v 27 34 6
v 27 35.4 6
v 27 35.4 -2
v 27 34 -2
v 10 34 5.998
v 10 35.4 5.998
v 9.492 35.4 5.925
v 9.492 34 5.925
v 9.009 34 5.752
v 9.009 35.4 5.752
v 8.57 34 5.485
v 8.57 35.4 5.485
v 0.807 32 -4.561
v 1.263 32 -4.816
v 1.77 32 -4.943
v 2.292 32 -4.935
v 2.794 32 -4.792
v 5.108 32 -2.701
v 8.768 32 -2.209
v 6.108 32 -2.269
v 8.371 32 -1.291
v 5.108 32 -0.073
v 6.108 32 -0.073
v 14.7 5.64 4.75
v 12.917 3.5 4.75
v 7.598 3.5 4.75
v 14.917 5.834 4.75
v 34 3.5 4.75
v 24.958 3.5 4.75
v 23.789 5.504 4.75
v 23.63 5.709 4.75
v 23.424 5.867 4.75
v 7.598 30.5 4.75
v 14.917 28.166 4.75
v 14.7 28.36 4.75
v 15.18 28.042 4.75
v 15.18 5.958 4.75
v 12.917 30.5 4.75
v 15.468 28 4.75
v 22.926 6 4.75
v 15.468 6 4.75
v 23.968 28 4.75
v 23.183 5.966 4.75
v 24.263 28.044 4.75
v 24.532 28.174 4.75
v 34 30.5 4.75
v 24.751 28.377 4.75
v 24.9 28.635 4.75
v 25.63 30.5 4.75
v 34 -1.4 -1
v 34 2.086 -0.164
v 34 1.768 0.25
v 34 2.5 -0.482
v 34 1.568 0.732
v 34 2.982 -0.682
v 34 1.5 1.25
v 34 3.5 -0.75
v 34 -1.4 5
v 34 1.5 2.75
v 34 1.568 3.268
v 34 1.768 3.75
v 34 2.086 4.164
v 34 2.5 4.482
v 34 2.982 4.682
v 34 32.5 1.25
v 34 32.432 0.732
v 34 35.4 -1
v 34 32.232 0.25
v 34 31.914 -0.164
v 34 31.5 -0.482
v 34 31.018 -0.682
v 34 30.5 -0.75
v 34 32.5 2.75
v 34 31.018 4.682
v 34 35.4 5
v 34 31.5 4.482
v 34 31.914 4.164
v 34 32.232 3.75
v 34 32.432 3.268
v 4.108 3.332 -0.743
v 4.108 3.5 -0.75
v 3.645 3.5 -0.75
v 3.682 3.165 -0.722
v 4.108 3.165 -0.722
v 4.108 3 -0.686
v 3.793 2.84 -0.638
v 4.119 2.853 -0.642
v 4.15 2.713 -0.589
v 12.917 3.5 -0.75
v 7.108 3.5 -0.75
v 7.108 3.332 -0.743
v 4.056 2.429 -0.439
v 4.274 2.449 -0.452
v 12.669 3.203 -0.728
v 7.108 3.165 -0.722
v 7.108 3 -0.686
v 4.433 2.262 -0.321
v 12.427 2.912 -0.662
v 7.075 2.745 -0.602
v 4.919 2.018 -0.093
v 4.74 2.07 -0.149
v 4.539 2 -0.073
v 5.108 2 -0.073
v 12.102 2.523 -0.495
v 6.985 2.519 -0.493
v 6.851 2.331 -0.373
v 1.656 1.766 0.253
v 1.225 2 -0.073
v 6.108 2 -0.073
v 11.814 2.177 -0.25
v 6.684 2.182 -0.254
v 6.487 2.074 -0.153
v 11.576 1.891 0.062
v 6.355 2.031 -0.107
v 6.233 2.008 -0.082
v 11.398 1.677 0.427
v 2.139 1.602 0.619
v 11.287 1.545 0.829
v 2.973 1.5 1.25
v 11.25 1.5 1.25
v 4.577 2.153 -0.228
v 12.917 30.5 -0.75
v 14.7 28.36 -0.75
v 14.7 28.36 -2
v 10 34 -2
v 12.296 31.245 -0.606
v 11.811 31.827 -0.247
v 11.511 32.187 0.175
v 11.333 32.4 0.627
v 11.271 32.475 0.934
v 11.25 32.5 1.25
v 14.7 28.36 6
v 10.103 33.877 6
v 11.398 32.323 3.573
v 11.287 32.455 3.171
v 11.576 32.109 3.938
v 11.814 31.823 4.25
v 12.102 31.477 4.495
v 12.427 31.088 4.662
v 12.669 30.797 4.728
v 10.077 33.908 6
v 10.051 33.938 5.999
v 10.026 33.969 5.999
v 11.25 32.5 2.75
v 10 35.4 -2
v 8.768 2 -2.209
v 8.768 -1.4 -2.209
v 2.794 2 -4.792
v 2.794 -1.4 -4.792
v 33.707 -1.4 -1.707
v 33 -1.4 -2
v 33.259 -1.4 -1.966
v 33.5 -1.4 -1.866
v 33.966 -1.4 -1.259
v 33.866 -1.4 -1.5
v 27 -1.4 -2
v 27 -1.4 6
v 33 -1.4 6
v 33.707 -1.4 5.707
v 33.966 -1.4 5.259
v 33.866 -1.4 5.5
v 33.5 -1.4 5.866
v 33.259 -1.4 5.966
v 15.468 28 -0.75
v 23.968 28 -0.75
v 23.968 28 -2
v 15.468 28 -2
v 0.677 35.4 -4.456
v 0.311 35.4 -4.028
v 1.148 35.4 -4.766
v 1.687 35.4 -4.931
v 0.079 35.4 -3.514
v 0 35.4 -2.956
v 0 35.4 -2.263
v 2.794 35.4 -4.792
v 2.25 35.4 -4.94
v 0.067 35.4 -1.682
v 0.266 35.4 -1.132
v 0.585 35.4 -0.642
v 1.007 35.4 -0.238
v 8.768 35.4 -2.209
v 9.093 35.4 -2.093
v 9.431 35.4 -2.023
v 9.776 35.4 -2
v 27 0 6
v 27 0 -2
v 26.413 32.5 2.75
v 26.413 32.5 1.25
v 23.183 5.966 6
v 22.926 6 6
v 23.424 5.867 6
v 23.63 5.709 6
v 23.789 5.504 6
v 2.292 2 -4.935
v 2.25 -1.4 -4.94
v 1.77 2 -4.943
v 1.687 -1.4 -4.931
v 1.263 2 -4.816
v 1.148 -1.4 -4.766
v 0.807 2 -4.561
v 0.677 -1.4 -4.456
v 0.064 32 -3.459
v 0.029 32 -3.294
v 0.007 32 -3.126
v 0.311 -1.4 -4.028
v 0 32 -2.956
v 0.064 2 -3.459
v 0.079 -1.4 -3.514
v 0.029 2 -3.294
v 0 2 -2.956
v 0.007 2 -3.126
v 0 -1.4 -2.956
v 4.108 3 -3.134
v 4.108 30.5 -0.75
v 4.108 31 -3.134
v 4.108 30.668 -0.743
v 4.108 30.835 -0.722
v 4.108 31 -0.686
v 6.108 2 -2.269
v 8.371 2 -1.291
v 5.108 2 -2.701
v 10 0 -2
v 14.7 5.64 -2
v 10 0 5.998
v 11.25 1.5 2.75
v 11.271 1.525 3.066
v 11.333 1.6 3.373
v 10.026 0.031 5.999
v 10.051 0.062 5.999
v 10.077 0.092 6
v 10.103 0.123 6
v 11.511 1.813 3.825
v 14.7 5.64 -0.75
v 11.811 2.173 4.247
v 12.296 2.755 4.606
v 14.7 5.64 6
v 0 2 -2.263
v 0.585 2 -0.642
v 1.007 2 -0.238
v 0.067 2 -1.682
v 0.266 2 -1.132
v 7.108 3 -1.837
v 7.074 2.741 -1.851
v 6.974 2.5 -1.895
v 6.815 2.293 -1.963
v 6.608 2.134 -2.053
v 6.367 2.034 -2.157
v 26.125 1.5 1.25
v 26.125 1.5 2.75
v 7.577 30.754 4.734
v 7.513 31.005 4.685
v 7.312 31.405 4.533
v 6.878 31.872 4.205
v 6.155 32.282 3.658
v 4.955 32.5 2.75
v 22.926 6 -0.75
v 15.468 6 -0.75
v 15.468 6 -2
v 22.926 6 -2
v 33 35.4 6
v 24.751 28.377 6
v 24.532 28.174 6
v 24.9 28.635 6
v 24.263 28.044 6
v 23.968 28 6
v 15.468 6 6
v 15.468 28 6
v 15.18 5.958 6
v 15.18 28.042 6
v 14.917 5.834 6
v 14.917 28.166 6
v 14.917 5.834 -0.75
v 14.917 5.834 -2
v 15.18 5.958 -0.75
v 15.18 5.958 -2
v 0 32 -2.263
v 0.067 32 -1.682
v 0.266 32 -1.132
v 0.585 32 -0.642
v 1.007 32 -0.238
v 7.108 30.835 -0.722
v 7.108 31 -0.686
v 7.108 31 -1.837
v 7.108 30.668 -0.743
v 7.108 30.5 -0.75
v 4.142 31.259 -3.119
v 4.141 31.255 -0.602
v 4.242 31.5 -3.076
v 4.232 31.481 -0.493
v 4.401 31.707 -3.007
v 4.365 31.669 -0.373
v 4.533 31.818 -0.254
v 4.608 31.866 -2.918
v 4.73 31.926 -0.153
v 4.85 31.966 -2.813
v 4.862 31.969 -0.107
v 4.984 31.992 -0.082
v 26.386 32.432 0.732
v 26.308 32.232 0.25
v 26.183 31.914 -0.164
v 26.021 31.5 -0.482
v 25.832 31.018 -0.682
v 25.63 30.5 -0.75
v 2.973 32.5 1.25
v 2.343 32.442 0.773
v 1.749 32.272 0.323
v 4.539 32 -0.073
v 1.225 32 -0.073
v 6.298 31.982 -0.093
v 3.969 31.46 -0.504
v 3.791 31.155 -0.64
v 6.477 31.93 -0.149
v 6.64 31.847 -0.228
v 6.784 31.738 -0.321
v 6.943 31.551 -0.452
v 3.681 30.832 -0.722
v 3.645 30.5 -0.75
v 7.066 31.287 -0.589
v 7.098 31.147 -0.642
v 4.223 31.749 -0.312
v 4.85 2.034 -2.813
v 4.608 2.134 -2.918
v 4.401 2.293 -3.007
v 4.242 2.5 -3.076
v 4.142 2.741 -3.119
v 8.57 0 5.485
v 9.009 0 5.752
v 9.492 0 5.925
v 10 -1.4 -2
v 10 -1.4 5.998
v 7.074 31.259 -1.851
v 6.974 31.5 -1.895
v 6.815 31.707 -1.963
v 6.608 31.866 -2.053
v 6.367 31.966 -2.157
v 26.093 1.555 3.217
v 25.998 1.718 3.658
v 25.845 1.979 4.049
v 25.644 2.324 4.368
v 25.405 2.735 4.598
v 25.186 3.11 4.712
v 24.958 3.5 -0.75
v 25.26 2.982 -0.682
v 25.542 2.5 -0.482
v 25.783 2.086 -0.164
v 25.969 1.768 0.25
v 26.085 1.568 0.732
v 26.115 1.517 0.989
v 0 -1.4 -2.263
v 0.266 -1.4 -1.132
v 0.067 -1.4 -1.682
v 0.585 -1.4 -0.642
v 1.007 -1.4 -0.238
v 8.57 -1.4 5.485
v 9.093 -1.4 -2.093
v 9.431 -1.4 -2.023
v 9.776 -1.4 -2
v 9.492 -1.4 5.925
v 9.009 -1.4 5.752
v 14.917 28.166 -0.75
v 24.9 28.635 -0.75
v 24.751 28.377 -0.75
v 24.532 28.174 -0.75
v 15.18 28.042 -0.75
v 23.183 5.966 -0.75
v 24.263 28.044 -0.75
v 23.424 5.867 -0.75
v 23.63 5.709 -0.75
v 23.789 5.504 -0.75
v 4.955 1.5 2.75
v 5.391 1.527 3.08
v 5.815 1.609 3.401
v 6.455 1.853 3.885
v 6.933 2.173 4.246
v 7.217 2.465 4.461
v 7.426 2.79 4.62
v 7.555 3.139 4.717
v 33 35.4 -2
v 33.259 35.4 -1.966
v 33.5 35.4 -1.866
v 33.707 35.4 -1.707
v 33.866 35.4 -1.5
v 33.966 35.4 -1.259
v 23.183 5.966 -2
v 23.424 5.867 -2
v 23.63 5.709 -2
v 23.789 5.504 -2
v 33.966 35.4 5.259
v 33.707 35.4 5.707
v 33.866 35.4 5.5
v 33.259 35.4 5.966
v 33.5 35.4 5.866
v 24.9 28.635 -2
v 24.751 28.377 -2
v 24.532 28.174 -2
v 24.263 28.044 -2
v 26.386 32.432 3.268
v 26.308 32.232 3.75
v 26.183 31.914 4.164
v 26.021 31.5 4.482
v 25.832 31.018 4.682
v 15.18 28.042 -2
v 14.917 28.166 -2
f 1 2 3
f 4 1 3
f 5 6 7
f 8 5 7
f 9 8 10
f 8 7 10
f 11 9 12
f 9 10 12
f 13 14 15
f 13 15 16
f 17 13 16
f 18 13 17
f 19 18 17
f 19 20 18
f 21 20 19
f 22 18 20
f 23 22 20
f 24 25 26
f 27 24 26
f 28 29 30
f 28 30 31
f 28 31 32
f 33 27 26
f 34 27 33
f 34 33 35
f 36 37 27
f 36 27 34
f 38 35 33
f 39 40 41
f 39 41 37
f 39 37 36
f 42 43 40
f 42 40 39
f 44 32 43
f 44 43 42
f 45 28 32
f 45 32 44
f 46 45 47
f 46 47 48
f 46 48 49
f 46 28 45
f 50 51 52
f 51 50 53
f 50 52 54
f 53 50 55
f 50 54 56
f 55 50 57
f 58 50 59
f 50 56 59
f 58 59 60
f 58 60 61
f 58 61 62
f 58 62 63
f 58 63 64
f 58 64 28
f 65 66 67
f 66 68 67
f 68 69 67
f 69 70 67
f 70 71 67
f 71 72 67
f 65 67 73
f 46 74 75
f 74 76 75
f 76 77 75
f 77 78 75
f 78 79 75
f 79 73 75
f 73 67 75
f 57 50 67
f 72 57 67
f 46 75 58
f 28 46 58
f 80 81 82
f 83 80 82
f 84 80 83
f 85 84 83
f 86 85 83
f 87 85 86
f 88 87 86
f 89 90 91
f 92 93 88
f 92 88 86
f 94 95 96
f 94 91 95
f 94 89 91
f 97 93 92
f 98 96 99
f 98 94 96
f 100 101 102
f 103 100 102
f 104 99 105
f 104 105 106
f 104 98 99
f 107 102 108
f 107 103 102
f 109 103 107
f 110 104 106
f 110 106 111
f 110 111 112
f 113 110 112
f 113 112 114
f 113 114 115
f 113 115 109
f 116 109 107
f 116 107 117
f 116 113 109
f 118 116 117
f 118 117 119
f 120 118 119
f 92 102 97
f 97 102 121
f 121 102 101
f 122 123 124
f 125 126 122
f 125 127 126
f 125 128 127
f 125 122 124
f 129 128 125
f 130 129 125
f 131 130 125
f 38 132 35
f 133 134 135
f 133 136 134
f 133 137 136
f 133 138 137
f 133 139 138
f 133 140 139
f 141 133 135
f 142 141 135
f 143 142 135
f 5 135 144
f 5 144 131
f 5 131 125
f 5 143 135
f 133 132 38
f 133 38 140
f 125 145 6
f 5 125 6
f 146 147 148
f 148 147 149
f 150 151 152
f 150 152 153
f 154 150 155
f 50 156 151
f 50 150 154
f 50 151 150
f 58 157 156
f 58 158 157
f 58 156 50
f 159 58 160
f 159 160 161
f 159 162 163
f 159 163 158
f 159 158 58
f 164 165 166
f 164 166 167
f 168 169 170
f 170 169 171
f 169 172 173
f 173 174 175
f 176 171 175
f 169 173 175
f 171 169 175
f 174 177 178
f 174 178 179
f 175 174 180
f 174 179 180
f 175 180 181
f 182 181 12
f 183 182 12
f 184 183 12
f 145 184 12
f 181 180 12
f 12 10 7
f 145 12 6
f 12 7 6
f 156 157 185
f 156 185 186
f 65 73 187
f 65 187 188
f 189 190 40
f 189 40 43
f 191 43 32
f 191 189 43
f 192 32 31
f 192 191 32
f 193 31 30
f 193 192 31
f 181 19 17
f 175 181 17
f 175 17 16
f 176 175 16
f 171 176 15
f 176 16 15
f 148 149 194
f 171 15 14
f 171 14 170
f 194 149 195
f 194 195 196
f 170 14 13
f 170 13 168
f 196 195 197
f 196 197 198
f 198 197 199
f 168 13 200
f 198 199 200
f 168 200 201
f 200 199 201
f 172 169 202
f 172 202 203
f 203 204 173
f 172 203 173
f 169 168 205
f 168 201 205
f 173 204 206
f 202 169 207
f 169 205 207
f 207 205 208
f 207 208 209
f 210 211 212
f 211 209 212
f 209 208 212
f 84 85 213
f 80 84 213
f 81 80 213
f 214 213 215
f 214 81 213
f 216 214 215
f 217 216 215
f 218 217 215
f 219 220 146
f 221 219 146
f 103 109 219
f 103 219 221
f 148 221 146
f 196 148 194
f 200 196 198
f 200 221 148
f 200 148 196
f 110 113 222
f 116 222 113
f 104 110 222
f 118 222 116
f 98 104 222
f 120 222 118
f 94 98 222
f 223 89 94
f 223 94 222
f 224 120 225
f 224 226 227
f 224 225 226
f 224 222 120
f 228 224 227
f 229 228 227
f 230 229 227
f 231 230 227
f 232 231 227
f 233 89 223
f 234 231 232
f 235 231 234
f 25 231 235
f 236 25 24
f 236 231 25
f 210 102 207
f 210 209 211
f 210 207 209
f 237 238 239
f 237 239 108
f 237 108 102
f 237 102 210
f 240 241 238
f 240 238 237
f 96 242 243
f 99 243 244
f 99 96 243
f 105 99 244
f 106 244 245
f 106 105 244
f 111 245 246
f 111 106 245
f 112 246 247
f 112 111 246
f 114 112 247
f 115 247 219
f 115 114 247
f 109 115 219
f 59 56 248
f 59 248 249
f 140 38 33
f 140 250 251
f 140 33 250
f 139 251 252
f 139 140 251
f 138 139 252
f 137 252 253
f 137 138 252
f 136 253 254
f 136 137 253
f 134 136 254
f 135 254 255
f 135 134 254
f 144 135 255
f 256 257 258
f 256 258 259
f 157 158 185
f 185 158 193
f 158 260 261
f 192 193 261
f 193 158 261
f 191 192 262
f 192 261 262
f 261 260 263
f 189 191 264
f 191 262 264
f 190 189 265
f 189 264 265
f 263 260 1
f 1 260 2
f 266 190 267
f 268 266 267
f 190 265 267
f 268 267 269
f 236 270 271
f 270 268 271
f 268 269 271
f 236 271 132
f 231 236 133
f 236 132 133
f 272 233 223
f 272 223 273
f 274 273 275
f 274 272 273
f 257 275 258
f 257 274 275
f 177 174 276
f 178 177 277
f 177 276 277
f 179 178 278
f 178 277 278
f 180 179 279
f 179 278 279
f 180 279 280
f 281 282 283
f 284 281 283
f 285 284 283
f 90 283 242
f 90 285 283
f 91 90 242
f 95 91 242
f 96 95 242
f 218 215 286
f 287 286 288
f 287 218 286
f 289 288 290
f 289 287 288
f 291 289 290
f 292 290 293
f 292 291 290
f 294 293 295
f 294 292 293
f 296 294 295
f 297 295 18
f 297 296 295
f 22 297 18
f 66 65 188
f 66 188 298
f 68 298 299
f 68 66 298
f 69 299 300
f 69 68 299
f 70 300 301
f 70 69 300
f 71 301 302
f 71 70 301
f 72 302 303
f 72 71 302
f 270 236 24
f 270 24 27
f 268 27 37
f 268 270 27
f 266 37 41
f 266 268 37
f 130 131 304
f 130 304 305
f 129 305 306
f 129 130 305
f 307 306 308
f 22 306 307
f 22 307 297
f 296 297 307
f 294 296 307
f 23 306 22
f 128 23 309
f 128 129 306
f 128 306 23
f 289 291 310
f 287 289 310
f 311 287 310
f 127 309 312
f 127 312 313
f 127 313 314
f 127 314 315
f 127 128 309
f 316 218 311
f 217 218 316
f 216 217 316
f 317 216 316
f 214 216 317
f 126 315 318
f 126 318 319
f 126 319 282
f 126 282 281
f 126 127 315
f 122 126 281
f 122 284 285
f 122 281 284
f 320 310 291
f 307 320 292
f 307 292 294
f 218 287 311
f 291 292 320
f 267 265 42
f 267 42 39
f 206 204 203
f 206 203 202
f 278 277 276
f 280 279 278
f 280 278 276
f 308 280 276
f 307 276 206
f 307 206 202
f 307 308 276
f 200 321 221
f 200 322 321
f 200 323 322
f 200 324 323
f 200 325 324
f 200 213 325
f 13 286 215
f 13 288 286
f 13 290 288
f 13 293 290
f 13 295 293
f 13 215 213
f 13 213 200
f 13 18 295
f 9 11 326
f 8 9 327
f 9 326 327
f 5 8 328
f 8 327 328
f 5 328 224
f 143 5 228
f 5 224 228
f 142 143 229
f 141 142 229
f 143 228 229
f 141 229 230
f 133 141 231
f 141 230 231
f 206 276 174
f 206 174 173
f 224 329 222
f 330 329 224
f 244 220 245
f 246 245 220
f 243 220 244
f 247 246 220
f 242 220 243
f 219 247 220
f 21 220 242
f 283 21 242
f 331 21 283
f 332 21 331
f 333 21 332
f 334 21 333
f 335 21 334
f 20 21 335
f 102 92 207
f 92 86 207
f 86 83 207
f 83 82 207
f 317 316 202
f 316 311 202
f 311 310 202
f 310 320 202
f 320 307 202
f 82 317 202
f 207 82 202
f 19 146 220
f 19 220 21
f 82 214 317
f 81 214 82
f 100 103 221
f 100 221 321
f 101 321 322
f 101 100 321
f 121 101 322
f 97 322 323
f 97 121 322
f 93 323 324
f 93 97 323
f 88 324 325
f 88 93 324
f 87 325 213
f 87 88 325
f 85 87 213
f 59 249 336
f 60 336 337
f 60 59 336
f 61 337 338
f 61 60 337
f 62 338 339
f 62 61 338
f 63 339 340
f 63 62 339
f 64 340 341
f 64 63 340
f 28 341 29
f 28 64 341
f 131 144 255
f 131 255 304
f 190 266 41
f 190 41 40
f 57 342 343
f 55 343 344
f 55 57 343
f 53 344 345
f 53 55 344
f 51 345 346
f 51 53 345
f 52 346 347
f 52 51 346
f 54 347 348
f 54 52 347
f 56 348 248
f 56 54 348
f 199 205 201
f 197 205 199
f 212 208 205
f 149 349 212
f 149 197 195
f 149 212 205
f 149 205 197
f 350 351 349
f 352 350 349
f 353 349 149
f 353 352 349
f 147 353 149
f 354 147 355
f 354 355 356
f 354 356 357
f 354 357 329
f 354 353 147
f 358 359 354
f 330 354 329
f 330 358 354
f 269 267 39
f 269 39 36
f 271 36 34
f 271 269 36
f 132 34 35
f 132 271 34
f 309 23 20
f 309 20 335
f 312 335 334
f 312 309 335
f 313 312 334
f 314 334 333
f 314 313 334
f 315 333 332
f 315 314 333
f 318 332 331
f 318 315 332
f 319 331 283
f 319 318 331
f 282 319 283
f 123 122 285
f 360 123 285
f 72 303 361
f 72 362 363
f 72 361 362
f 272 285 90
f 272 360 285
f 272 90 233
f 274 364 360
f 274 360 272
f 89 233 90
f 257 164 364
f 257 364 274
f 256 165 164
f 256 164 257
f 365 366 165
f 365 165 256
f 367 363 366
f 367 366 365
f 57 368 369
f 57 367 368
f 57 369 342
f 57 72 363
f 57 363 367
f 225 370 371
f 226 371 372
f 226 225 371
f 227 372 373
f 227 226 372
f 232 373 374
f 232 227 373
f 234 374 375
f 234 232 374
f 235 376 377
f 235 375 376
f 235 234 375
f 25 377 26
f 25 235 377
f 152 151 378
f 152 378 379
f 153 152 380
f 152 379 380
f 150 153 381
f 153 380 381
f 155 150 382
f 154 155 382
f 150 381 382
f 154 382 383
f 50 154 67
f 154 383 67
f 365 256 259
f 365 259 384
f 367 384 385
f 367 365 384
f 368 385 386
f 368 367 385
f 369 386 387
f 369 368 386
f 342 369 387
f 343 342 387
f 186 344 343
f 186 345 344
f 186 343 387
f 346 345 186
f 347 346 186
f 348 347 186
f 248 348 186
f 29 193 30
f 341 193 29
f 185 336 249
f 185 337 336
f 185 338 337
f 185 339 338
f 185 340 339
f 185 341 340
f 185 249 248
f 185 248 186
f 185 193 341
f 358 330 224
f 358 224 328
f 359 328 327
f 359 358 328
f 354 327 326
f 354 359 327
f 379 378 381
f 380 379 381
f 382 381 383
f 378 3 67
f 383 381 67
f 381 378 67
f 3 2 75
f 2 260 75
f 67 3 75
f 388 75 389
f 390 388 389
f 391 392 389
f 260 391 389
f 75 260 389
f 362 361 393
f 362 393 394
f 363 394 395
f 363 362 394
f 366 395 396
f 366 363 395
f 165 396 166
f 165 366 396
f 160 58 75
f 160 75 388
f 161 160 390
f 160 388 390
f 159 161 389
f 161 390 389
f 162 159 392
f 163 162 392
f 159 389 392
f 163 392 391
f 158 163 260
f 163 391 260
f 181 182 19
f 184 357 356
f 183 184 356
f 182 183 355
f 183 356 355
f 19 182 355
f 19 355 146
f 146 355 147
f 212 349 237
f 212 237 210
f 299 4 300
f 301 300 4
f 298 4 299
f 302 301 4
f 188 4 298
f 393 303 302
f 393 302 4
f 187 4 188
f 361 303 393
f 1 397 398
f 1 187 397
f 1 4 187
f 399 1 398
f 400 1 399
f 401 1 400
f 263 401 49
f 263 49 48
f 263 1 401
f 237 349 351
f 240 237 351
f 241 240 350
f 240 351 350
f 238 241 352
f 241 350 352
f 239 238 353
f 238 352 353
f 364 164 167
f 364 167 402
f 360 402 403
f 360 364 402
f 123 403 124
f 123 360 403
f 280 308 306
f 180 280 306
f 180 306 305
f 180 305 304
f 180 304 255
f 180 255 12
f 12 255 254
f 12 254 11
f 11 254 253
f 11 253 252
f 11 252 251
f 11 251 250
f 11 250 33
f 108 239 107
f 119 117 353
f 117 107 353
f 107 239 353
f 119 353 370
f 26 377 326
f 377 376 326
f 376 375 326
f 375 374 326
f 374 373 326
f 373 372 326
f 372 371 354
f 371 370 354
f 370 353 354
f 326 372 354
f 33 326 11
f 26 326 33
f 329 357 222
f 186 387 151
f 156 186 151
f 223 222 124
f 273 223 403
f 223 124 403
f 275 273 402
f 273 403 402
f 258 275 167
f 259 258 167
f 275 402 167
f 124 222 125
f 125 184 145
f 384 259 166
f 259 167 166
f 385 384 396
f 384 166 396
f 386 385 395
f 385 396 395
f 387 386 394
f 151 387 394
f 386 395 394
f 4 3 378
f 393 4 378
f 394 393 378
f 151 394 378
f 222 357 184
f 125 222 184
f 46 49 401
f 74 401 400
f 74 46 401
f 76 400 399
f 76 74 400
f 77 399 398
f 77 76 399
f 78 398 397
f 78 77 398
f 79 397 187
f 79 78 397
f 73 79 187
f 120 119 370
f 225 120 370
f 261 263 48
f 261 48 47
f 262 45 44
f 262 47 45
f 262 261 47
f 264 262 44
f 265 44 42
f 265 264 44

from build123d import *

# Parameters (mm, degrees)
SKETCH1_W               = 34
SKETCH1_H               = 12
BOSS_EXTRUDE1_DEPTH     = 34.00000007
CUT_EXTRUDE_THIN1_DEPTH = 49.456165807
CUT_EXTRUDE1_DEPTH      = 2
SKETCH5_W               = 8.508301653
SKETCH5_H               = 30.00000007
CUT_EXTRUDE2_DEPTH      = 1
CUT_EXTRUDE3_DEPTH      = 50.315688701
CUT_EXTRUDE4_DEPTH      = 49.456165807
BOSS_EXTRUDE2_START     = 1.4
BOSS_EXTRUDE2_DEPTH     = 1.4


with BuildPart() as part:
    # Sketch1 → Boss-Extrude1 (new body)
    with BuildSketch(Plane(origin=(0, 0, 0), x_dir=(1, 0, 0), z_dir=(0, 1, 0))):
        with Locations((17, 0)):
            Rectangle(SKETCH1_W, SKETCH1_H)
    extrude(amount=BOSS_EXTRUDE1_DEPTH)

    # Sketch2 → Cut-Extrude-Thin1 (cut, through all)
    with BuildSketch(Plane.XZ):
        with BuildLine():
            Line((33, -9.62), (10.827001263, -9.62))
            Line((10.827001263, -9.62), (5.81828527, -11.78593124))
            ThreePointArc((5.81828527, -11.78593124), (-3.282636449, -10.995932133), (-7.62, -2.956146555))
            Line((-7.62, -2.956146555), (-7.62, -2.263164725))
            ThreePointArc((-7.62, -2.263164725), (-6.557151524, 2.260930118), (-3.590977529, 5.838484153))
            Line((-3.590977529, 5.838484153), (3.971775857, 11.561648878))
            ThreePointArc((3.971775857, 11.561648878), (6.869113997, 13.091675675), (10.102753387, 13.62))
            Line((10.102753387, 13.62), (33, 13.62))
            ThreePointArc((33, 13.62), (39.095260454, 11.095260454), (41.62, 5))
            Line((41.62, 5), (41.62, -1))
            ThreePointArc((41.62, -1), (39.095260454, -7.095260454), (33, -9.62))
        make_face()
        with BuildLine():
            Line((33, -2), (9.775667088, -2))
            ThreePointArc((9.775667088, -2), (9.260908141, -2.052707652), (8.767512765, -2.208643129))
            Line((8.767512765, -2.208643129), (2.793822301, -4.791860626))
            ThreePointArc((2.793822301, -4.791860626), (0.901738784, -4.627619648), (0, -2.956146555))
            Line((0, -2.956146555), (0, -2.263164725))
            ThreePointArc((0, -2.263164725), (0.265712119, -1.132141014), (1.007255618, -0.237752506))
            Line((1.007255618, -0.237752506), (8.570009004, 5.485412219))
            ThreePointArc((8.570009004, 5.485412219), (9.294343539, 5.867918919), (10.102753387, 6))
            Line((10.102753387, 6), (33, 6))
            ThreePointArc((33, 6), (33.707106781, 5.707106781), (34, 5))
            Line((34, 5), (34, -1))
            ThreePointArc((34, -1), (33.707106781, -1.707106781), (33, -2))
        make_face(mode=Mode.SUBTRACT)
    extrude(amount=-CUT_EXTRUDE_THIN1_DEPTH, mode=Mode.SUBTRACT)

    # Sketch3 → Cut-Extrude1 (cut)
    with BuildSketch(Plane(origin=(0.481189039, 0, -0.635856944), x_dir=(0.7974063856023161, 0, 0.6034426701855364), z_dir=(-0.6034426701855365, 0, 0.7974063856023162))):
        with BuildLine():
            Line((-2.189052199, 32.00000007), (7.310947801, 32.00000007))
            ThreePointArc((7.310947801, 32.00000007), (8.018054582, 31.707106851), (8.310947801, 31.00000007))
            Line((8.310947801, 31.00000007), (8.310947801, 3))
            ThreePointArc((8.310947801, 3), (8.018054582, 2.292893219), (7.310947801, 2))
            Line((7.310947801, 2), (-2.189052199, 2))
            Line((-2.189052199, 2), (-2.189052199, 32.00000007))
        make_face()
    extrude(amount=-CUT_EXTRUDE1_DEPTH, mode=Mode.SUBTRACT)

    # Sketch5 → Cut-Extrude2 (cut)
    with BuildSketch(Plane(origin=(2.185846154, 0, -5.054769231), x_dir=(-0.9178570359601427, 0, -0.39691115068546684), z_dir=(0.39691115068546684, 0, -0.9178570359601427))):
        with Locations((-2.916537368, 17.000000035)):
            Rectangle(SKETCH5_W, SKETCH5_H)
    extrude(amount=-CUT_EXTRUDE2_DEPTH, mode=Mode.SUBTRACT)

    # Sketch6 → Cut-Extrude3 (cut, through all)
    with BuildSketch(Plane.XY.offset(6)):
        with BuildLine():
            Line((5.108391885, 32.00000007), (6.108391885, 32.00000007))
            ThreePointArc((6.108391885, 32.00000007), (6.815498667, 31.707106851), (7.108391885, 31.00000007))
            Line((7.108391885, 31.00000007), (7.108391885, 3))
            ThreePointArc((7.108391885, 3), (6.815498667, 2.292893219), (6.108391885, 2))
            Line((6.108391885, 2), (5.108391885, 2))
            ThreePointArc((5.108391885, 2), (4.401285104, 2.292893219), (4.108391885, 3))
            Line((4.108391885, 3), (4.108391885, 31.00000007))
            ThreePointArc((4.108391885, 31.00000007), (4.401285104, 31.707106851), (5.108391885, 32.00000007))
        make_face()
        with BuildLine():
            Line((10, 34.00000007), (27, 34.00000007))
            Line((27, 34.00000007), (24.899542929, 28.635409633))
            ThreePointArc((24.899542929, 28.635409633), (24.532028014, 28.173988436), (23.968374946, 28.00000007))
            Line((23.968374946, 28.00000007), (15.468374946, 28.00000007))
            ThreePointArc((15.468374946, 28.00000007), (15.04421955, 28.094410649), (14.700153666, 28.35981567))
            Line((14.700153666, 28.35981567), (10, 34.00000007))
        make_face()
        with BuildLine():
            Line((10, 0), (14.700153666, 5.6401844))
            ThreePointArc((14.700153666, 5.6401844), (15.04421955, 5.905589421), (15.468374946, 6))
            Line((15.468374946, 6), (22.925629668, 6))
            ThreePointArc((22.925629668, 6), (23.423690394, 5.867142153), (23.789408568, 5.503871026))
            Line((23.789408568, 5.503871026), (27, 0))
            Line((27, 0), (10, 0))
        make_face()
    extrude(amount=-CUT_EXTRUDE3_DEPTH, mode=Mode.SUBTRACT)

    # Sketch7 → Cut-Extrude4 (cut, through all)
    with BuildSketch(Plane(origin=(34, 0, 0), x_dir=(0, 0, -1), z_dir=(1, 0, 0))):
        with BuildLine():
            Line((-2.75, 32.50000007), (-1.25, 32.50000007))
            ThreePointArc((-1.25, 32.50000007), (0.164213562, 31.914213632), (0.75, 30.50000007))
            Line((0.75, 30.50000007), (0.75, 3.5))
            ThreePointArc((0.75, 3.5), (0.164213562, 2.085786438), (-1.25, 1.5))
            Line((-1.25, 1.5), (-2.75, 1.5))
            ThreePointArc((-2.75, 1.5), (-4.164213562, 2.085786438), (-4.75, 3.5))
            Line((-4.75, 3.5), (-4.75, 30.50000007))
            ThreePointArc((-4.75, 30.50000007), (-4.164213562, 31.914213632), (-2.75, 32.50000007))
        make_face()
    extrude(amount=-CUT_EXTRUDE4_DEPTH, mode=Mode.SUBTRACT)

    # Sketch8 → Boss-Extrude2 (add)
    with BuildSketch(Plane.XZ.offset(BOSS_EXTRUDE2_START)):
        with BuildLine():
            Line((27, 6), (27, -2))
            Line((27, -2), (33, -2))
            ThreePointArc((33, -2), (33.707106781, -1.707106781), (34, -1))
            Line((34, -1), (34, 5))
            ThreePointArc((34, 5), (33.707106781, 5.707106781), (33, 6))
            Line((33, 6), (27, 6))
        make_face()
        with BuildLine():
            Line((10, -2), (10, 5.997920752))
            ThreePointArc((10, 5.997920752), (9.245793944, 5.851070997), (8.570009004, 5.485412219))
            Line((8.570009004, 5.485412219), (1.007255618, -0.237752506))
            ThreePointArc((1.007255618, -0.237752506), (0.265712119, -1.132141014), (0, -2.263164725))
            Line((0, -2.263164725), (0, -2.956146555))
            ThreePointArc((0, -2.956146555), (0.901738784, -4.627619648), (2.793822301, -4.791860626))
            Line((2.793822301, -4.791860626), (8.767512765, -2.208643129))
            ThreePointArc((8.767512765, -2.208643129), (9.260908141, -2.052707652), (9.775667088, -2))
            Line((9.775667088, -2), (10, -2))
        make_face()
    boss_extrude2 = extrude(amount=-BOSS_EXTRUDE2_DEPTH)

    # Mirror1: Boss-Extrude2 across plane
    add(boss_extrude2.mirror(Plane(origin=(0, 17.000000035, 0), x_dir=(0, 0, 1), z_dir=(0, -1, 0))))


solid = part.part
